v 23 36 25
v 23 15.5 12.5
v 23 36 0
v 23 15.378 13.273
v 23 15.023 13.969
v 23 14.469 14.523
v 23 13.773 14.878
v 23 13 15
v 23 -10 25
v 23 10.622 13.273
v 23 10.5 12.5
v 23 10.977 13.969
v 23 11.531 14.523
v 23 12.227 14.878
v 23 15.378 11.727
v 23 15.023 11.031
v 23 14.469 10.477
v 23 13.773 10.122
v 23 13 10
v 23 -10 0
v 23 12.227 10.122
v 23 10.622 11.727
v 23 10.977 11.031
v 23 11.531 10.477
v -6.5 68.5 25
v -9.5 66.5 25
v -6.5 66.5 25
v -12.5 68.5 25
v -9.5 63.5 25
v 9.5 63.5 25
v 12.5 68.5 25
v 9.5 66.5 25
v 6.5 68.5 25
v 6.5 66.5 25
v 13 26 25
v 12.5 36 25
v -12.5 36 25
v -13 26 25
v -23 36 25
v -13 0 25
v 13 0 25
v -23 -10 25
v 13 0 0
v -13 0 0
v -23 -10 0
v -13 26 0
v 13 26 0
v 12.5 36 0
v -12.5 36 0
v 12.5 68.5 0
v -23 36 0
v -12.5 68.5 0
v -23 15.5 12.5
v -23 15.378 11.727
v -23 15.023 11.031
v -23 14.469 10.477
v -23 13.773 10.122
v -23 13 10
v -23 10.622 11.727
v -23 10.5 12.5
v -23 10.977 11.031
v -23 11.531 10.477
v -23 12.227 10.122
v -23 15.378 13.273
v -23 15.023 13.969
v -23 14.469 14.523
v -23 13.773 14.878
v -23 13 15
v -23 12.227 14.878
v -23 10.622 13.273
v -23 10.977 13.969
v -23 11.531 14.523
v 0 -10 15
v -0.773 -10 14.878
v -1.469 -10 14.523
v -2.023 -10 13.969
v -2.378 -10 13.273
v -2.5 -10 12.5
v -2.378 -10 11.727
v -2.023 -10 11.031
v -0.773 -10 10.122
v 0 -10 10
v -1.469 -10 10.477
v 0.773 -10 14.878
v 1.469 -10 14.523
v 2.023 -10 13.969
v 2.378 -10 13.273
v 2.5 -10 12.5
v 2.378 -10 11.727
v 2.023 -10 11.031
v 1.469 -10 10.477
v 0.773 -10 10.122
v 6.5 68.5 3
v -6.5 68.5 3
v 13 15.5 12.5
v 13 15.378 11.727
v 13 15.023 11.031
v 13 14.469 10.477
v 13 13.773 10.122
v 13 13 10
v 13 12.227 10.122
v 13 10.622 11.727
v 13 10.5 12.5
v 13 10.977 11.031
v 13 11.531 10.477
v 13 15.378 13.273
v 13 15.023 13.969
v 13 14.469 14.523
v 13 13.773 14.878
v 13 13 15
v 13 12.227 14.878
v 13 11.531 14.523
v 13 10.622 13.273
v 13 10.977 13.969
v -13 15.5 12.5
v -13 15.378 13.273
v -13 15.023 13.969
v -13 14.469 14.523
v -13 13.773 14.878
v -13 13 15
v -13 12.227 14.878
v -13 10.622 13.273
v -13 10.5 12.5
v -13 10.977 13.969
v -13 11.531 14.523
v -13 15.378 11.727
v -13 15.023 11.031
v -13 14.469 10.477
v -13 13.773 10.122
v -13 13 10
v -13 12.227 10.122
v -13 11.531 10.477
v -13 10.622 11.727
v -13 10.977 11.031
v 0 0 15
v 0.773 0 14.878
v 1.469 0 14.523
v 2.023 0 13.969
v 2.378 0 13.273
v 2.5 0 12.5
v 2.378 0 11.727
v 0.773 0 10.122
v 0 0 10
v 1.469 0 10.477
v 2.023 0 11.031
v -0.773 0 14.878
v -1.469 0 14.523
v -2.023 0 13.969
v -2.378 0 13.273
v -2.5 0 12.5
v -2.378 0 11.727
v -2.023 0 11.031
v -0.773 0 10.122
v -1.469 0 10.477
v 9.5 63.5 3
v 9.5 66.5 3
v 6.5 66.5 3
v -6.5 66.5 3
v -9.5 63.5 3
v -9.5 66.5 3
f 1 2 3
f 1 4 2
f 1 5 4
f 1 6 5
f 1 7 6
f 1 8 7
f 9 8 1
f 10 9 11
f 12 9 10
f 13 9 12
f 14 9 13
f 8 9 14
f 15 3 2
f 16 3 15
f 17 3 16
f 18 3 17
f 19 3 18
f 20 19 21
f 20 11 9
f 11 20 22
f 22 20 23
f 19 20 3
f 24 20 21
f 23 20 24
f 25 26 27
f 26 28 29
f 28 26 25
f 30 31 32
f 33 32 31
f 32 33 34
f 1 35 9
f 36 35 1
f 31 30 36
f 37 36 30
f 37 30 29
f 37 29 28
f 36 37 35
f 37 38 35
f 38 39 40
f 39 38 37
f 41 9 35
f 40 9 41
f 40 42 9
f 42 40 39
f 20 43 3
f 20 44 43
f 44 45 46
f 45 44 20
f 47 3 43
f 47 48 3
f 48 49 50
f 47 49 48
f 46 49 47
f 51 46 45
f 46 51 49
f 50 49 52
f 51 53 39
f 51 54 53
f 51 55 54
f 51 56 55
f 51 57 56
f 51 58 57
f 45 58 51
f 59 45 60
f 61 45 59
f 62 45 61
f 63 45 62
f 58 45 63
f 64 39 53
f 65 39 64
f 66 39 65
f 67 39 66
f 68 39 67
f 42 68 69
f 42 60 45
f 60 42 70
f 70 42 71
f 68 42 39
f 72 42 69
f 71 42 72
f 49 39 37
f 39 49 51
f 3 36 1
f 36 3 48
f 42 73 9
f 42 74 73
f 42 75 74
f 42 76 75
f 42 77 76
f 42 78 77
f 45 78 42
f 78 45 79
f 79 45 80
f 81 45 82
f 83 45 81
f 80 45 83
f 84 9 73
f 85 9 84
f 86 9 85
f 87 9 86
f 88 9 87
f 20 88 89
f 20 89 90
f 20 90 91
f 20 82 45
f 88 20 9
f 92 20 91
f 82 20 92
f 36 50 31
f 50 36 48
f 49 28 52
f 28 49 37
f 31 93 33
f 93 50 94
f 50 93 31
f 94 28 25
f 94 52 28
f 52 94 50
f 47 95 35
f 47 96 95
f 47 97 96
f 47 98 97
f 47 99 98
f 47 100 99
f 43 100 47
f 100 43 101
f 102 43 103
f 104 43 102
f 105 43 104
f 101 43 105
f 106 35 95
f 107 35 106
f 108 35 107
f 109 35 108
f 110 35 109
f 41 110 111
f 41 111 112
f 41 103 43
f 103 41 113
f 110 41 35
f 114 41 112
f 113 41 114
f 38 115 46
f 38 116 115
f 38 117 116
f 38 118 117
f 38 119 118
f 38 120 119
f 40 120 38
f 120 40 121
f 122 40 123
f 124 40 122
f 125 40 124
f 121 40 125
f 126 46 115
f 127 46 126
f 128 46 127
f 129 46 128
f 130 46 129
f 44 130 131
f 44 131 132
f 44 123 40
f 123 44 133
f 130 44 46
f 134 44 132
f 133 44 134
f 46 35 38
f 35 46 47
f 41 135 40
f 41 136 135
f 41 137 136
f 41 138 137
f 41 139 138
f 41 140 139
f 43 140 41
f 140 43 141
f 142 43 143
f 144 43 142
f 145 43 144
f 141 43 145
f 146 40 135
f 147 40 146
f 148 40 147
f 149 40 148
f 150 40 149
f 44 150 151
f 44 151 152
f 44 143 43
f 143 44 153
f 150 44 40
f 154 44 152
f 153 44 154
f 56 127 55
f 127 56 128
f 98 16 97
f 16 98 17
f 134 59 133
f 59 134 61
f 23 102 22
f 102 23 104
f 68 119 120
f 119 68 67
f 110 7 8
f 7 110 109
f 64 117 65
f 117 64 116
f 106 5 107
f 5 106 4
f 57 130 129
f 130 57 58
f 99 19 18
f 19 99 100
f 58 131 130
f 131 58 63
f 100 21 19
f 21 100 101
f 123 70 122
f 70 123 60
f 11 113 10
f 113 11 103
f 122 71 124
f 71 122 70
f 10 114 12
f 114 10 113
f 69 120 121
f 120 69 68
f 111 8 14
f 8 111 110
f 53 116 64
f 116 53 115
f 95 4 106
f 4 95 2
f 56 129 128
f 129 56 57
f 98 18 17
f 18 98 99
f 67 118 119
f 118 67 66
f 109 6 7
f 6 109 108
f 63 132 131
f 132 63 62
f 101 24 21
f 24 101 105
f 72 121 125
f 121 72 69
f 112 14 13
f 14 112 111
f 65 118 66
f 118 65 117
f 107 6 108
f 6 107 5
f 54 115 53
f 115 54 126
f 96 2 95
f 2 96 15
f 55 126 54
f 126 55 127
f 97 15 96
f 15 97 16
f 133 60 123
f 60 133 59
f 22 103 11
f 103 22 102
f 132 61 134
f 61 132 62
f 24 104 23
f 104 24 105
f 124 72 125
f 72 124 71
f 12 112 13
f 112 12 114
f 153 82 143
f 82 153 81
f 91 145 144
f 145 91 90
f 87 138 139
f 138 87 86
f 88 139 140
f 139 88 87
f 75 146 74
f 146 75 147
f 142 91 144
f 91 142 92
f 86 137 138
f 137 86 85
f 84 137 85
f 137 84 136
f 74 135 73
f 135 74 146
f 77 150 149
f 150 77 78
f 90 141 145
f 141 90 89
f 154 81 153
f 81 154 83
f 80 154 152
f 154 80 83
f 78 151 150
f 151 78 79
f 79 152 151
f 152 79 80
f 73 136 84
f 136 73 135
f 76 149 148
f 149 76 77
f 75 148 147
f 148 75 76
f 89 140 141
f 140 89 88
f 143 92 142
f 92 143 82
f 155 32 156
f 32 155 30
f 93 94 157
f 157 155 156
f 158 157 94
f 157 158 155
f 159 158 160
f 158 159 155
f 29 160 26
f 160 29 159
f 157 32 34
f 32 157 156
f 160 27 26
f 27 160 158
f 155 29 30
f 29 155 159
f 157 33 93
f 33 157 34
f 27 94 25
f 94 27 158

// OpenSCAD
// file: variables.scad
// Slide imager variables

//Design and code by Simon Harris, BGS
// simhar@bgs.ac.uk | www.SHphoto.co.uk

//the centre height of the optical system
centerheight=97.5;
// the rail size, allowing a slight positive tolerance (25.4mm becomes 26mm)
rail=26;
//rear filter glass diameter and thickness - remove from holder wearing eye protection
filterdia=63;
filterthick=3;
//diffuser plate dimensions
diffuserdia=60;
diffuserthick=3;
//pivot arm length for filter
pivot=50;
//front filter dimensions - leave in holder
camerafilterdia=57;
camerafilterthread=55;
camerafiltermass=28;
//counterweights
counterweightlength=38.5;
counterweightwidth=13.5;
counterweightmass=12.75 * 3;
//servo dimensions, allowing a slight positive tolerance (0.5mm?) and relative positions of pivot point with wire at bottom, as well as max dimension across ears
servox=12;
servoy=23;
servoxpivot=6;
servoypivot=8;
servoears=32;
// main file
//A simple slide block that allows 6mm fixings on the rail

//Design and code by Simon Harris, BGS
// simhar@bgs.ac.uk | www.SHphoto.co.uk

//You should examine and adjust the file variables.scad to modify this design
include <variables.scad>;
//rail size is taken from the global variables file
slideblockthickness=10;
slideblockheight=25;
centreheight=0;
//measure the distance from the centre of the light to the base of the foot
lightheight=60;


difference(){

union(){
//slide block
translate([-slideblockthickness-rail/2,-centreheight-slideblockthickness,0])
cube([rail+slideblockthickness+slideblockthickness,rail+slideblockthickness+slideblockthickness,slideblockheight]);
//light support
translate([-12.5,0,0])
cube([25, rail+centerheight-lightheight+5, slideblockheight]);
}
//support rail
translate([-(rail)/2,-centreheight,-10])
cube([rail,rail,60]);

//clamp screws to rail
translate([-75,-centreheight+(rail/2),slideblockheight/2])
rotate([0,90,0])
cylinder(h = 150, r=2.5, center = false, $fn=20);

translate([0,25,slideblockheight/2])
rotate([90,0,0])
cylinder(h = 50, r=2.5, center = false, $fn=20);

//foot of light
translate([-9.5,rail+centerheight-lightheight,3])
cube([19, 3, slideblockheight]);
translate([-6.5,rail+centerheight-lightheight+3,3])
cube([13, 5, slideblockheight]);
}
